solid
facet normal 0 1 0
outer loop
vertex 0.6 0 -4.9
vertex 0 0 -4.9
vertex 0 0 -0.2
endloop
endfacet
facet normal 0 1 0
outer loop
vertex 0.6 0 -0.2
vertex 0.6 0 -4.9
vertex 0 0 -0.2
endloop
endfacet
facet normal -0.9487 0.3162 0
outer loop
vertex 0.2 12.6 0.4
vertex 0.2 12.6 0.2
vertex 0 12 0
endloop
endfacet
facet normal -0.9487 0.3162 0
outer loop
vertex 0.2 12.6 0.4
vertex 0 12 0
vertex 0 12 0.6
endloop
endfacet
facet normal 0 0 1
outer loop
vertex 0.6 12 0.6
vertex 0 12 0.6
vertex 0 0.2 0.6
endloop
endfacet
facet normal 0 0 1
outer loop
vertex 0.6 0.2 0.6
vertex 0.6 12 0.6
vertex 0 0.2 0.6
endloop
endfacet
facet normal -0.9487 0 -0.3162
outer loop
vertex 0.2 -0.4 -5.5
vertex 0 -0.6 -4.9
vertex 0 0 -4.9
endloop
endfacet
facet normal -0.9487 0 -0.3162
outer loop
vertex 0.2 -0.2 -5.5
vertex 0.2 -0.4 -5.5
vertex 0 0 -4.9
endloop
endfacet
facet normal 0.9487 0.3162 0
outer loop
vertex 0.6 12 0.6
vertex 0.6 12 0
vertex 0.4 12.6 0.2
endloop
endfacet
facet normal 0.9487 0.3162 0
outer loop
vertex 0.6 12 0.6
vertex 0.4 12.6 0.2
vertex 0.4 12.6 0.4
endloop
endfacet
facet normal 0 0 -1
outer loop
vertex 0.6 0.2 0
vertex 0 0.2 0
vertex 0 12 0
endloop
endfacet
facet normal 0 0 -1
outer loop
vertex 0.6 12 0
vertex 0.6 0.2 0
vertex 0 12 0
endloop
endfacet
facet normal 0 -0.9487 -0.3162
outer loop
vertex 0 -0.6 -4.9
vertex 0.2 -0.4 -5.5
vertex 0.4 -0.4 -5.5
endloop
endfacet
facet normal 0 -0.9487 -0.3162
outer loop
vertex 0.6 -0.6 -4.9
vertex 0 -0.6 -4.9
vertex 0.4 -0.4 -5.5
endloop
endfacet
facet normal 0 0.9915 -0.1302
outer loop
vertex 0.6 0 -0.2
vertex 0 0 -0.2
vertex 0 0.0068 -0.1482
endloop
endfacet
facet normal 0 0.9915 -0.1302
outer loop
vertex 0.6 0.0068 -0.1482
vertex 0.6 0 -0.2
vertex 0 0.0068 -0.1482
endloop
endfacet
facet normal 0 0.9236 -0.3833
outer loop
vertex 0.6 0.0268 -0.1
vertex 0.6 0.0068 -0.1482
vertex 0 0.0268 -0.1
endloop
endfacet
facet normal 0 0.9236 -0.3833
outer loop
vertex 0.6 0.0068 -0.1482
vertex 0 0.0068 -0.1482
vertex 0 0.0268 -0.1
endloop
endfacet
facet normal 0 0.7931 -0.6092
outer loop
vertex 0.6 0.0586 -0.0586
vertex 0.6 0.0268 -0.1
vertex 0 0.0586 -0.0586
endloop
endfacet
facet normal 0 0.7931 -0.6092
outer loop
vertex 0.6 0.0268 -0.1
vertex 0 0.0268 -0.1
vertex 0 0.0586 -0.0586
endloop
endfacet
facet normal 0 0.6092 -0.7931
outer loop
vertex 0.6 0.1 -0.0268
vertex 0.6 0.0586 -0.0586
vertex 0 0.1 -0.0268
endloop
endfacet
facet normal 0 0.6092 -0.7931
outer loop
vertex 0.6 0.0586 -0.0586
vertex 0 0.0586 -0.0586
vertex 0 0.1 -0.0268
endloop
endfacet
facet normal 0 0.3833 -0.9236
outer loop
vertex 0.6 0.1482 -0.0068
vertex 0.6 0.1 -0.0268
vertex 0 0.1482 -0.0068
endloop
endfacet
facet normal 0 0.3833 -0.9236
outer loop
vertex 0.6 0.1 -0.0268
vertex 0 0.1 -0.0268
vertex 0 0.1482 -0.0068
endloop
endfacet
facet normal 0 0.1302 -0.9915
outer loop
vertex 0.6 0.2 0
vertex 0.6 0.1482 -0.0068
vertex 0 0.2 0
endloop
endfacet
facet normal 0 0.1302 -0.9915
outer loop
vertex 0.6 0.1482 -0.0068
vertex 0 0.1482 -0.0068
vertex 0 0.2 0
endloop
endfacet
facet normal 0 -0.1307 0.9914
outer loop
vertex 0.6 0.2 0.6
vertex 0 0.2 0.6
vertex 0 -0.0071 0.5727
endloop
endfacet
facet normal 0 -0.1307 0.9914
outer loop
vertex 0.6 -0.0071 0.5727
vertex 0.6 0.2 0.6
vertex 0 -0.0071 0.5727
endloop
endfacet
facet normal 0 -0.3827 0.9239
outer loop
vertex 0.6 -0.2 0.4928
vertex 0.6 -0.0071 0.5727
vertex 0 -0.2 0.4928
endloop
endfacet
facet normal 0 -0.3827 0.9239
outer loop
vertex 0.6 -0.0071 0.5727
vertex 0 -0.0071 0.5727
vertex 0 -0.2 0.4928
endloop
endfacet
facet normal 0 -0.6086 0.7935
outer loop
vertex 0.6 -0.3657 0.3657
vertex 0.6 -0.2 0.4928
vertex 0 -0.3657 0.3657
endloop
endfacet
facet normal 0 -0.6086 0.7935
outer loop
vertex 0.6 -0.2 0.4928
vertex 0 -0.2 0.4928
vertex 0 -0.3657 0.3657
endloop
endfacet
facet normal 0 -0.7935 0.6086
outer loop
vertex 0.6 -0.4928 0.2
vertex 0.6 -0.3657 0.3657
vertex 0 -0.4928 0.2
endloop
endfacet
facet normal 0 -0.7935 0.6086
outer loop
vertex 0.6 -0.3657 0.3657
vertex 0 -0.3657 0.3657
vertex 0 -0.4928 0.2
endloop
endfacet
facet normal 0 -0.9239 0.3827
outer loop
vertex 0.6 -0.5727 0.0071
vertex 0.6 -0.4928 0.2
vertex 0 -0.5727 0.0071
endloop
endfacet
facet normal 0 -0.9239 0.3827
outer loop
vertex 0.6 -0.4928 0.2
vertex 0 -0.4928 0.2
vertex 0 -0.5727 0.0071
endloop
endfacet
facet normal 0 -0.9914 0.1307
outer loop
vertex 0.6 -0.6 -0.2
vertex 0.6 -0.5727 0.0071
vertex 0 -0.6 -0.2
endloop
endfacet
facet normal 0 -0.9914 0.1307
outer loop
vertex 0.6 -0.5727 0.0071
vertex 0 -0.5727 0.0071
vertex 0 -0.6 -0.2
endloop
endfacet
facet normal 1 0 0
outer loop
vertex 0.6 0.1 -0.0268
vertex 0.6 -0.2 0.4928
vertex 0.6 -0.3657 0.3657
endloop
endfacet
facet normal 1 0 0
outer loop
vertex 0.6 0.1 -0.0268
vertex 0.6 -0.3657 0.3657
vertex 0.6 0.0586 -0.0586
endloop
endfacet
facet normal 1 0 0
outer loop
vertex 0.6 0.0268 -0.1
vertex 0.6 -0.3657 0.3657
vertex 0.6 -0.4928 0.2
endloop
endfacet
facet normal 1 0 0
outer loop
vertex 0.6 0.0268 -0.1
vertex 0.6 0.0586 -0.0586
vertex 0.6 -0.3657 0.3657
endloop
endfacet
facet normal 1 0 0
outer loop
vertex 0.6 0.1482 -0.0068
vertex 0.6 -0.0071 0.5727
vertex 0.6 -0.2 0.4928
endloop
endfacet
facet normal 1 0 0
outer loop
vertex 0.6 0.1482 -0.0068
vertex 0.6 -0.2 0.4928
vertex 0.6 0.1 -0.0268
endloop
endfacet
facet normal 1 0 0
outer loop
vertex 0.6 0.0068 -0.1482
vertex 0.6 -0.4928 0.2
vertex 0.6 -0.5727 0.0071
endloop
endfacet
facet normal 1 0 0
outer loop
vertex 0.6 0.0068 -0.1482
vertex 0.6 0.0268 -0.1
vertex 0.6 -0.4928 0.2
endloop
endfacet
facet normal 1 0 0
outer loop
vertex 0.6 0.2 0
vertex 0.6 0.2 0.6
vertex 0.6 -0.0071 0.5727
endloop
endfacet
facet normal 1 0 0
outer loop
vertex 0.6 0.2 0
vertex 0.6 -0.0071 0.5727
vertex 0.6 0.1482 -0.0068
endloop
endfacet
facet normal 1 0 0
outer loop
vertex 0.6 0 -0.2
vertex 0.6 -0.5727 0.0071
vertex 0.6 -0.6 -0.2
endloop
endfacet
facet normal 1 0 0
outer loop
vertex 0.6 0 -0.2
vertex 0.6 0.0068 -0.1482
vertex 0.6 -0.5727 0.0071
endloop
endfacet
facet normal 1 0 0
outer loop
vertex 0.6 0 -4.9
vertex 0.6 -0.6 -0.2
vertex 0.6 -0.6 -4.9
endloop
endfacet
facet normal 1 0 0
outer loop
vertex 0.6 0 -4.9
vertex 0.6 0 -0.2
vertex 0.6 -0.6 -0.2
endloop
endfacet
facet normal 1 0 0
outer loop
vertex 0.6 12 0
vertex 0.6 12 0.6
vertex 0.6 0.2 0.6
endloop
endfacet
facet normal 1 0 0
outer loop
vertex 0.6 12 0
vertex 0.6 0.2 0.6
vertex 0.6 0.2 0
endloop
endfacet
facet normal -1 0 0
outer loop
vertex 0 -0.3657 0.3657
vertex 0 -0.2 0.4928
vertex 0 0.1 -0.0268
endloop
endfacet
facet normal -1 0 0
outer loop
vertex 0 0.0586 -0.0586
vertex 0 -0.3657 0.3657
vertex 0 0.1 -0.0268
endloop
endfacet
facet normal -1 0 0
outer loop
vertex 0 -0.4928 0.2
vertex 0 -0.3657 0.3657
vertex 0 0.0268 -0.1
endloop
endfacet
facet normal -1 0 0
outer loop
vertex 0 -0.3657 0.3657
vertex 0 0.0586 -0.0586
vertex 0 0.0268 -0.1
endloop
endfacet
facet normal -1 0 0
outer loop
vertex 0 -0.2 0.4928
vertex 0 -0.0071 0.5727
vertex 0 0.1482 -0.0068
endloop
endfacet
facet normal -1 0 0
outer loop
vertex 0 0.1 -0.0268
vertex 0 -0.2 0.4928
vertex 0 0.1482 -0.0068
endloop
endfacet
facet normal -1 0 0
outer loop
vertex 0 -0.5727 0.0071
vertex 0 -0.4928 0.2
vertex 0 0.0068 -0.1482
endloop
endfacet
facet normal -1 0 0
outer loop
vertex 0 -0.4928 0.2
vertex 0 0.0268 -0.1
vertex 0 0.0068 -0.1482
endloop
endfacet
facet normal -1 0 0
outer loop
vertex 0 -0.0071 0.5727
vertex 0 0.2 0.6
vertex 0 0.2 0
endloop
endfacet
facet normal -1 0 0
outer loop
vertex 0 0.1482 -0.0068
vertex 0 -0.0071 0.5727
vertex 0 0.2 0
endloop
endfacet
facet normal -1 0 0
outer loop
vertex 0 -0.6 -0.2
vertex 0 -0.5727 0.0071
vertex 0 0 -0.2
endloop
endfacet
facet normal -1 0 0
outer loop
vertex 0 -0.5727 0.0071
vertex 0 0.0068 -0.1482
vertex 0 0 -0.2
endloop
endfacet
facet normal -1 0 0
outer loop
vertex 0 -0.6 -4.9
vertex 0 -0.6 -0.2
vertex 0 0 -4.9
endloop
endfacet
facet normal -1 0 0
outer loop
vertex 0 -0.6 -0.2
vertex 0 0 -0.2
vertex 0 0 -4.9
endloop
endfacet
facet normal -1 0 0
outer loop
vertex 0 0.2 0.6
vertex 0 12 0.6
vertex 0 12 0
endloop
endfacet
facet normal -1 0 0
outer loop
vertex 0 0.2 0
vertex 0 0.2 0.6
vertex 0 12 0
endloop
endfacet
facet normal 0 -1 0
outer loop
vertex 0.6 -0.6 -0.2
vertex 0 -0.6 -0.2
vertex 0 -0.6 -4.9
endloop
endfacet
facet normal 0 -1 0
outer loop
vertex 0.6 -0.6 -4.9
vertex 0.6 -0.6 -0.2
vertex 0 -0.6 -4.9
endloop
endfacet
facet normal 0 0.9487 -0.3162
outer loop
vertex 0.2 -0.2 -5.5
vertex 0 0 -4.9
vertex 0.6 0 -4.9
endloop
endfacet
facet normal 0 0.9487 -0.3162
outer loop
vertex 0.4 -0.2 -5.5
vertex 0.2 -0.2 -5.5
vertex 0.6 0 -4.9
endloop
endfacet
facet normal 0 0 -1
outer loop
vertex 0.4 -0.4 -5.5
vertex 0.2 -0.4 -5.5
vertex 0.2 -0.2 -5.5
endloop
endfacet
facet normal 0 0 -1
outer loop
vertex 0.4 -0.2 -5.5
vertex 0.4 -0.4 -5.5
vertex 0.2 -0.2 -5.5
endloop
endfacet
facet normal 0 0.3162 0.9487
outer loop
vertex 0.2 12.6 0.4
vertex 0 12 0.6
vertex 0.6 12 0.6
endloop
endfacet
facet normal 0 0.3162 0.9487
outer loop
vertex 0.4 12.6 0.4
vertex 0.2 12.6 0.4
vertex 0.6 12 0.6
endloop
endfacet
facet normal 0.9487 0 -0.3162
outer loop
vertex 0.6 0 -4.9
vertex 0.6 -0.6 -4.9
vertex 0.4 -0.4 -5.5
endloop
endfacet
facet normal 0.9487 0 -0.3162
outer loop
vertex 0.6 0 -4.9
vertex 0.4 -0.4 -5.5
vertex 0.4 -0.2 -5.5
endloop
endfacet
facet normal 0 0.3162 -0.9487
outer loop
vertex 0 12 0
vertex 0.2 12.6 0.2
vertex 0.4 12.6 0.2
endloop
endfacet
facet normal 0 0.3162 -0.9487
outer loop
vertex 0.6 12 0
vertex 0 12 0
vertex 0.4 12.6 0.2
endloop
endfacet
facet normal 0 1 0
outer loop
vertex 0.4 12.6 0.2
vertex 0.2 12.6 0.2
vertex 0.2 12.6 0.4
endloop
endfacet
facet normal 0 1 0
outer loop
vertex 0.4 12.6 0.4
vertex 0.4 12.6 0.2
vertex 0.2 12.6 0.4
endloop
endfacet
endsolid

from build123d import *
from OCP.BRepFilletAPI import BRepFilletAPI_MakeChamfer

# Parameters (mm, degrees)
AUFSATZ_LINEAR_AUSTRAGEN1_DEPTH = 0.6
FASE1_SIZE                      = 0.2
FASE1_SIZE2                     = 0.6


with BuildPart() as part:
    # Skizze1 → Aufsatz-Linear austragen1 (new body)
    with BuildSketch(Plane(origin=(0, 0, 0), x_dir=(0, 0, -1), z_dir=(1, 0, 0))):
        with BuildLine():
            Line((0, 0.2), (0, 12.6))
            Line((0, 12.6), (-0.6, 12.6))
            Line((-0.6, 12.6), (-0.6, 0.2))
            ThreePointArc((-0.6, 0.2), (-0.365685425, -0.365685425), (0.2, -0.6))
            Line((0.2, -0.6), (5.5, -0.6))
            Line((5.5, -0.6), (5.5, 0))
            Line((5.5, 0), (0.2, 0))
            ThreePointArc((0.2, 0), (0.058578644, 0.058578644), (0, 0.2))
        make_face()
    extrude(amount=AUFSATZ_LINEAR_AUSTRAGEN1_DEPTH)

    # Fase1: one chamfer whose edges measure the first distance from different faces: ONE call of the kernel's chamfer builder (chamfer() names one face for all edges)
    fase1_edges_1 = [part.edges().sort_by_distance(p)[0] for p in [
        (0, 12.6, 0.3),
        (0.3, 12.6, 0),
        (0.3, 12.6, 0.6),
        (0.6, 12.6, 0.3),
    ]]
    fase1_side_1 = [part.faces().sort_by_distance(p)[0] for p in [
        (0.3, 12.6, 0.3),
    ]]
    fase1_edges_2 = [part.edges().sort_by_distance(p)[0] for p in [
        (0.3, 0, -5.5),
        (0.3, -0.6, -5.5),
        (0.6, -0.3, -5.5),
        (0, -0.3, -5.5),
    ]]
    fase1_side_2 = [part.faces().sort_by_distance(p)[0] for p in [
        (0.3, -0.3, -5.5),
    ]]
    fase1 = BRepFilletAPI_MakeChamfer(part.part.solid().wrapped)
    for e in fase1_edges_1:
        fase1.Add(FASE1_SIZE, FASE1_SIZE2, e.wrapped, fase1_side_1[0].wrapped)  # the first distance lies on this face
    for e in fase1_edges_2:
        fase1.Add(FASE1_SIZE, FASE1_SIZE2, e.wrapped, fase1_side_2[0].wrapped)  # the first distance lies on this face
    add(Compound.cast(fase1.Shape()), mode=Mode.REPLACE)


solid = part.part
